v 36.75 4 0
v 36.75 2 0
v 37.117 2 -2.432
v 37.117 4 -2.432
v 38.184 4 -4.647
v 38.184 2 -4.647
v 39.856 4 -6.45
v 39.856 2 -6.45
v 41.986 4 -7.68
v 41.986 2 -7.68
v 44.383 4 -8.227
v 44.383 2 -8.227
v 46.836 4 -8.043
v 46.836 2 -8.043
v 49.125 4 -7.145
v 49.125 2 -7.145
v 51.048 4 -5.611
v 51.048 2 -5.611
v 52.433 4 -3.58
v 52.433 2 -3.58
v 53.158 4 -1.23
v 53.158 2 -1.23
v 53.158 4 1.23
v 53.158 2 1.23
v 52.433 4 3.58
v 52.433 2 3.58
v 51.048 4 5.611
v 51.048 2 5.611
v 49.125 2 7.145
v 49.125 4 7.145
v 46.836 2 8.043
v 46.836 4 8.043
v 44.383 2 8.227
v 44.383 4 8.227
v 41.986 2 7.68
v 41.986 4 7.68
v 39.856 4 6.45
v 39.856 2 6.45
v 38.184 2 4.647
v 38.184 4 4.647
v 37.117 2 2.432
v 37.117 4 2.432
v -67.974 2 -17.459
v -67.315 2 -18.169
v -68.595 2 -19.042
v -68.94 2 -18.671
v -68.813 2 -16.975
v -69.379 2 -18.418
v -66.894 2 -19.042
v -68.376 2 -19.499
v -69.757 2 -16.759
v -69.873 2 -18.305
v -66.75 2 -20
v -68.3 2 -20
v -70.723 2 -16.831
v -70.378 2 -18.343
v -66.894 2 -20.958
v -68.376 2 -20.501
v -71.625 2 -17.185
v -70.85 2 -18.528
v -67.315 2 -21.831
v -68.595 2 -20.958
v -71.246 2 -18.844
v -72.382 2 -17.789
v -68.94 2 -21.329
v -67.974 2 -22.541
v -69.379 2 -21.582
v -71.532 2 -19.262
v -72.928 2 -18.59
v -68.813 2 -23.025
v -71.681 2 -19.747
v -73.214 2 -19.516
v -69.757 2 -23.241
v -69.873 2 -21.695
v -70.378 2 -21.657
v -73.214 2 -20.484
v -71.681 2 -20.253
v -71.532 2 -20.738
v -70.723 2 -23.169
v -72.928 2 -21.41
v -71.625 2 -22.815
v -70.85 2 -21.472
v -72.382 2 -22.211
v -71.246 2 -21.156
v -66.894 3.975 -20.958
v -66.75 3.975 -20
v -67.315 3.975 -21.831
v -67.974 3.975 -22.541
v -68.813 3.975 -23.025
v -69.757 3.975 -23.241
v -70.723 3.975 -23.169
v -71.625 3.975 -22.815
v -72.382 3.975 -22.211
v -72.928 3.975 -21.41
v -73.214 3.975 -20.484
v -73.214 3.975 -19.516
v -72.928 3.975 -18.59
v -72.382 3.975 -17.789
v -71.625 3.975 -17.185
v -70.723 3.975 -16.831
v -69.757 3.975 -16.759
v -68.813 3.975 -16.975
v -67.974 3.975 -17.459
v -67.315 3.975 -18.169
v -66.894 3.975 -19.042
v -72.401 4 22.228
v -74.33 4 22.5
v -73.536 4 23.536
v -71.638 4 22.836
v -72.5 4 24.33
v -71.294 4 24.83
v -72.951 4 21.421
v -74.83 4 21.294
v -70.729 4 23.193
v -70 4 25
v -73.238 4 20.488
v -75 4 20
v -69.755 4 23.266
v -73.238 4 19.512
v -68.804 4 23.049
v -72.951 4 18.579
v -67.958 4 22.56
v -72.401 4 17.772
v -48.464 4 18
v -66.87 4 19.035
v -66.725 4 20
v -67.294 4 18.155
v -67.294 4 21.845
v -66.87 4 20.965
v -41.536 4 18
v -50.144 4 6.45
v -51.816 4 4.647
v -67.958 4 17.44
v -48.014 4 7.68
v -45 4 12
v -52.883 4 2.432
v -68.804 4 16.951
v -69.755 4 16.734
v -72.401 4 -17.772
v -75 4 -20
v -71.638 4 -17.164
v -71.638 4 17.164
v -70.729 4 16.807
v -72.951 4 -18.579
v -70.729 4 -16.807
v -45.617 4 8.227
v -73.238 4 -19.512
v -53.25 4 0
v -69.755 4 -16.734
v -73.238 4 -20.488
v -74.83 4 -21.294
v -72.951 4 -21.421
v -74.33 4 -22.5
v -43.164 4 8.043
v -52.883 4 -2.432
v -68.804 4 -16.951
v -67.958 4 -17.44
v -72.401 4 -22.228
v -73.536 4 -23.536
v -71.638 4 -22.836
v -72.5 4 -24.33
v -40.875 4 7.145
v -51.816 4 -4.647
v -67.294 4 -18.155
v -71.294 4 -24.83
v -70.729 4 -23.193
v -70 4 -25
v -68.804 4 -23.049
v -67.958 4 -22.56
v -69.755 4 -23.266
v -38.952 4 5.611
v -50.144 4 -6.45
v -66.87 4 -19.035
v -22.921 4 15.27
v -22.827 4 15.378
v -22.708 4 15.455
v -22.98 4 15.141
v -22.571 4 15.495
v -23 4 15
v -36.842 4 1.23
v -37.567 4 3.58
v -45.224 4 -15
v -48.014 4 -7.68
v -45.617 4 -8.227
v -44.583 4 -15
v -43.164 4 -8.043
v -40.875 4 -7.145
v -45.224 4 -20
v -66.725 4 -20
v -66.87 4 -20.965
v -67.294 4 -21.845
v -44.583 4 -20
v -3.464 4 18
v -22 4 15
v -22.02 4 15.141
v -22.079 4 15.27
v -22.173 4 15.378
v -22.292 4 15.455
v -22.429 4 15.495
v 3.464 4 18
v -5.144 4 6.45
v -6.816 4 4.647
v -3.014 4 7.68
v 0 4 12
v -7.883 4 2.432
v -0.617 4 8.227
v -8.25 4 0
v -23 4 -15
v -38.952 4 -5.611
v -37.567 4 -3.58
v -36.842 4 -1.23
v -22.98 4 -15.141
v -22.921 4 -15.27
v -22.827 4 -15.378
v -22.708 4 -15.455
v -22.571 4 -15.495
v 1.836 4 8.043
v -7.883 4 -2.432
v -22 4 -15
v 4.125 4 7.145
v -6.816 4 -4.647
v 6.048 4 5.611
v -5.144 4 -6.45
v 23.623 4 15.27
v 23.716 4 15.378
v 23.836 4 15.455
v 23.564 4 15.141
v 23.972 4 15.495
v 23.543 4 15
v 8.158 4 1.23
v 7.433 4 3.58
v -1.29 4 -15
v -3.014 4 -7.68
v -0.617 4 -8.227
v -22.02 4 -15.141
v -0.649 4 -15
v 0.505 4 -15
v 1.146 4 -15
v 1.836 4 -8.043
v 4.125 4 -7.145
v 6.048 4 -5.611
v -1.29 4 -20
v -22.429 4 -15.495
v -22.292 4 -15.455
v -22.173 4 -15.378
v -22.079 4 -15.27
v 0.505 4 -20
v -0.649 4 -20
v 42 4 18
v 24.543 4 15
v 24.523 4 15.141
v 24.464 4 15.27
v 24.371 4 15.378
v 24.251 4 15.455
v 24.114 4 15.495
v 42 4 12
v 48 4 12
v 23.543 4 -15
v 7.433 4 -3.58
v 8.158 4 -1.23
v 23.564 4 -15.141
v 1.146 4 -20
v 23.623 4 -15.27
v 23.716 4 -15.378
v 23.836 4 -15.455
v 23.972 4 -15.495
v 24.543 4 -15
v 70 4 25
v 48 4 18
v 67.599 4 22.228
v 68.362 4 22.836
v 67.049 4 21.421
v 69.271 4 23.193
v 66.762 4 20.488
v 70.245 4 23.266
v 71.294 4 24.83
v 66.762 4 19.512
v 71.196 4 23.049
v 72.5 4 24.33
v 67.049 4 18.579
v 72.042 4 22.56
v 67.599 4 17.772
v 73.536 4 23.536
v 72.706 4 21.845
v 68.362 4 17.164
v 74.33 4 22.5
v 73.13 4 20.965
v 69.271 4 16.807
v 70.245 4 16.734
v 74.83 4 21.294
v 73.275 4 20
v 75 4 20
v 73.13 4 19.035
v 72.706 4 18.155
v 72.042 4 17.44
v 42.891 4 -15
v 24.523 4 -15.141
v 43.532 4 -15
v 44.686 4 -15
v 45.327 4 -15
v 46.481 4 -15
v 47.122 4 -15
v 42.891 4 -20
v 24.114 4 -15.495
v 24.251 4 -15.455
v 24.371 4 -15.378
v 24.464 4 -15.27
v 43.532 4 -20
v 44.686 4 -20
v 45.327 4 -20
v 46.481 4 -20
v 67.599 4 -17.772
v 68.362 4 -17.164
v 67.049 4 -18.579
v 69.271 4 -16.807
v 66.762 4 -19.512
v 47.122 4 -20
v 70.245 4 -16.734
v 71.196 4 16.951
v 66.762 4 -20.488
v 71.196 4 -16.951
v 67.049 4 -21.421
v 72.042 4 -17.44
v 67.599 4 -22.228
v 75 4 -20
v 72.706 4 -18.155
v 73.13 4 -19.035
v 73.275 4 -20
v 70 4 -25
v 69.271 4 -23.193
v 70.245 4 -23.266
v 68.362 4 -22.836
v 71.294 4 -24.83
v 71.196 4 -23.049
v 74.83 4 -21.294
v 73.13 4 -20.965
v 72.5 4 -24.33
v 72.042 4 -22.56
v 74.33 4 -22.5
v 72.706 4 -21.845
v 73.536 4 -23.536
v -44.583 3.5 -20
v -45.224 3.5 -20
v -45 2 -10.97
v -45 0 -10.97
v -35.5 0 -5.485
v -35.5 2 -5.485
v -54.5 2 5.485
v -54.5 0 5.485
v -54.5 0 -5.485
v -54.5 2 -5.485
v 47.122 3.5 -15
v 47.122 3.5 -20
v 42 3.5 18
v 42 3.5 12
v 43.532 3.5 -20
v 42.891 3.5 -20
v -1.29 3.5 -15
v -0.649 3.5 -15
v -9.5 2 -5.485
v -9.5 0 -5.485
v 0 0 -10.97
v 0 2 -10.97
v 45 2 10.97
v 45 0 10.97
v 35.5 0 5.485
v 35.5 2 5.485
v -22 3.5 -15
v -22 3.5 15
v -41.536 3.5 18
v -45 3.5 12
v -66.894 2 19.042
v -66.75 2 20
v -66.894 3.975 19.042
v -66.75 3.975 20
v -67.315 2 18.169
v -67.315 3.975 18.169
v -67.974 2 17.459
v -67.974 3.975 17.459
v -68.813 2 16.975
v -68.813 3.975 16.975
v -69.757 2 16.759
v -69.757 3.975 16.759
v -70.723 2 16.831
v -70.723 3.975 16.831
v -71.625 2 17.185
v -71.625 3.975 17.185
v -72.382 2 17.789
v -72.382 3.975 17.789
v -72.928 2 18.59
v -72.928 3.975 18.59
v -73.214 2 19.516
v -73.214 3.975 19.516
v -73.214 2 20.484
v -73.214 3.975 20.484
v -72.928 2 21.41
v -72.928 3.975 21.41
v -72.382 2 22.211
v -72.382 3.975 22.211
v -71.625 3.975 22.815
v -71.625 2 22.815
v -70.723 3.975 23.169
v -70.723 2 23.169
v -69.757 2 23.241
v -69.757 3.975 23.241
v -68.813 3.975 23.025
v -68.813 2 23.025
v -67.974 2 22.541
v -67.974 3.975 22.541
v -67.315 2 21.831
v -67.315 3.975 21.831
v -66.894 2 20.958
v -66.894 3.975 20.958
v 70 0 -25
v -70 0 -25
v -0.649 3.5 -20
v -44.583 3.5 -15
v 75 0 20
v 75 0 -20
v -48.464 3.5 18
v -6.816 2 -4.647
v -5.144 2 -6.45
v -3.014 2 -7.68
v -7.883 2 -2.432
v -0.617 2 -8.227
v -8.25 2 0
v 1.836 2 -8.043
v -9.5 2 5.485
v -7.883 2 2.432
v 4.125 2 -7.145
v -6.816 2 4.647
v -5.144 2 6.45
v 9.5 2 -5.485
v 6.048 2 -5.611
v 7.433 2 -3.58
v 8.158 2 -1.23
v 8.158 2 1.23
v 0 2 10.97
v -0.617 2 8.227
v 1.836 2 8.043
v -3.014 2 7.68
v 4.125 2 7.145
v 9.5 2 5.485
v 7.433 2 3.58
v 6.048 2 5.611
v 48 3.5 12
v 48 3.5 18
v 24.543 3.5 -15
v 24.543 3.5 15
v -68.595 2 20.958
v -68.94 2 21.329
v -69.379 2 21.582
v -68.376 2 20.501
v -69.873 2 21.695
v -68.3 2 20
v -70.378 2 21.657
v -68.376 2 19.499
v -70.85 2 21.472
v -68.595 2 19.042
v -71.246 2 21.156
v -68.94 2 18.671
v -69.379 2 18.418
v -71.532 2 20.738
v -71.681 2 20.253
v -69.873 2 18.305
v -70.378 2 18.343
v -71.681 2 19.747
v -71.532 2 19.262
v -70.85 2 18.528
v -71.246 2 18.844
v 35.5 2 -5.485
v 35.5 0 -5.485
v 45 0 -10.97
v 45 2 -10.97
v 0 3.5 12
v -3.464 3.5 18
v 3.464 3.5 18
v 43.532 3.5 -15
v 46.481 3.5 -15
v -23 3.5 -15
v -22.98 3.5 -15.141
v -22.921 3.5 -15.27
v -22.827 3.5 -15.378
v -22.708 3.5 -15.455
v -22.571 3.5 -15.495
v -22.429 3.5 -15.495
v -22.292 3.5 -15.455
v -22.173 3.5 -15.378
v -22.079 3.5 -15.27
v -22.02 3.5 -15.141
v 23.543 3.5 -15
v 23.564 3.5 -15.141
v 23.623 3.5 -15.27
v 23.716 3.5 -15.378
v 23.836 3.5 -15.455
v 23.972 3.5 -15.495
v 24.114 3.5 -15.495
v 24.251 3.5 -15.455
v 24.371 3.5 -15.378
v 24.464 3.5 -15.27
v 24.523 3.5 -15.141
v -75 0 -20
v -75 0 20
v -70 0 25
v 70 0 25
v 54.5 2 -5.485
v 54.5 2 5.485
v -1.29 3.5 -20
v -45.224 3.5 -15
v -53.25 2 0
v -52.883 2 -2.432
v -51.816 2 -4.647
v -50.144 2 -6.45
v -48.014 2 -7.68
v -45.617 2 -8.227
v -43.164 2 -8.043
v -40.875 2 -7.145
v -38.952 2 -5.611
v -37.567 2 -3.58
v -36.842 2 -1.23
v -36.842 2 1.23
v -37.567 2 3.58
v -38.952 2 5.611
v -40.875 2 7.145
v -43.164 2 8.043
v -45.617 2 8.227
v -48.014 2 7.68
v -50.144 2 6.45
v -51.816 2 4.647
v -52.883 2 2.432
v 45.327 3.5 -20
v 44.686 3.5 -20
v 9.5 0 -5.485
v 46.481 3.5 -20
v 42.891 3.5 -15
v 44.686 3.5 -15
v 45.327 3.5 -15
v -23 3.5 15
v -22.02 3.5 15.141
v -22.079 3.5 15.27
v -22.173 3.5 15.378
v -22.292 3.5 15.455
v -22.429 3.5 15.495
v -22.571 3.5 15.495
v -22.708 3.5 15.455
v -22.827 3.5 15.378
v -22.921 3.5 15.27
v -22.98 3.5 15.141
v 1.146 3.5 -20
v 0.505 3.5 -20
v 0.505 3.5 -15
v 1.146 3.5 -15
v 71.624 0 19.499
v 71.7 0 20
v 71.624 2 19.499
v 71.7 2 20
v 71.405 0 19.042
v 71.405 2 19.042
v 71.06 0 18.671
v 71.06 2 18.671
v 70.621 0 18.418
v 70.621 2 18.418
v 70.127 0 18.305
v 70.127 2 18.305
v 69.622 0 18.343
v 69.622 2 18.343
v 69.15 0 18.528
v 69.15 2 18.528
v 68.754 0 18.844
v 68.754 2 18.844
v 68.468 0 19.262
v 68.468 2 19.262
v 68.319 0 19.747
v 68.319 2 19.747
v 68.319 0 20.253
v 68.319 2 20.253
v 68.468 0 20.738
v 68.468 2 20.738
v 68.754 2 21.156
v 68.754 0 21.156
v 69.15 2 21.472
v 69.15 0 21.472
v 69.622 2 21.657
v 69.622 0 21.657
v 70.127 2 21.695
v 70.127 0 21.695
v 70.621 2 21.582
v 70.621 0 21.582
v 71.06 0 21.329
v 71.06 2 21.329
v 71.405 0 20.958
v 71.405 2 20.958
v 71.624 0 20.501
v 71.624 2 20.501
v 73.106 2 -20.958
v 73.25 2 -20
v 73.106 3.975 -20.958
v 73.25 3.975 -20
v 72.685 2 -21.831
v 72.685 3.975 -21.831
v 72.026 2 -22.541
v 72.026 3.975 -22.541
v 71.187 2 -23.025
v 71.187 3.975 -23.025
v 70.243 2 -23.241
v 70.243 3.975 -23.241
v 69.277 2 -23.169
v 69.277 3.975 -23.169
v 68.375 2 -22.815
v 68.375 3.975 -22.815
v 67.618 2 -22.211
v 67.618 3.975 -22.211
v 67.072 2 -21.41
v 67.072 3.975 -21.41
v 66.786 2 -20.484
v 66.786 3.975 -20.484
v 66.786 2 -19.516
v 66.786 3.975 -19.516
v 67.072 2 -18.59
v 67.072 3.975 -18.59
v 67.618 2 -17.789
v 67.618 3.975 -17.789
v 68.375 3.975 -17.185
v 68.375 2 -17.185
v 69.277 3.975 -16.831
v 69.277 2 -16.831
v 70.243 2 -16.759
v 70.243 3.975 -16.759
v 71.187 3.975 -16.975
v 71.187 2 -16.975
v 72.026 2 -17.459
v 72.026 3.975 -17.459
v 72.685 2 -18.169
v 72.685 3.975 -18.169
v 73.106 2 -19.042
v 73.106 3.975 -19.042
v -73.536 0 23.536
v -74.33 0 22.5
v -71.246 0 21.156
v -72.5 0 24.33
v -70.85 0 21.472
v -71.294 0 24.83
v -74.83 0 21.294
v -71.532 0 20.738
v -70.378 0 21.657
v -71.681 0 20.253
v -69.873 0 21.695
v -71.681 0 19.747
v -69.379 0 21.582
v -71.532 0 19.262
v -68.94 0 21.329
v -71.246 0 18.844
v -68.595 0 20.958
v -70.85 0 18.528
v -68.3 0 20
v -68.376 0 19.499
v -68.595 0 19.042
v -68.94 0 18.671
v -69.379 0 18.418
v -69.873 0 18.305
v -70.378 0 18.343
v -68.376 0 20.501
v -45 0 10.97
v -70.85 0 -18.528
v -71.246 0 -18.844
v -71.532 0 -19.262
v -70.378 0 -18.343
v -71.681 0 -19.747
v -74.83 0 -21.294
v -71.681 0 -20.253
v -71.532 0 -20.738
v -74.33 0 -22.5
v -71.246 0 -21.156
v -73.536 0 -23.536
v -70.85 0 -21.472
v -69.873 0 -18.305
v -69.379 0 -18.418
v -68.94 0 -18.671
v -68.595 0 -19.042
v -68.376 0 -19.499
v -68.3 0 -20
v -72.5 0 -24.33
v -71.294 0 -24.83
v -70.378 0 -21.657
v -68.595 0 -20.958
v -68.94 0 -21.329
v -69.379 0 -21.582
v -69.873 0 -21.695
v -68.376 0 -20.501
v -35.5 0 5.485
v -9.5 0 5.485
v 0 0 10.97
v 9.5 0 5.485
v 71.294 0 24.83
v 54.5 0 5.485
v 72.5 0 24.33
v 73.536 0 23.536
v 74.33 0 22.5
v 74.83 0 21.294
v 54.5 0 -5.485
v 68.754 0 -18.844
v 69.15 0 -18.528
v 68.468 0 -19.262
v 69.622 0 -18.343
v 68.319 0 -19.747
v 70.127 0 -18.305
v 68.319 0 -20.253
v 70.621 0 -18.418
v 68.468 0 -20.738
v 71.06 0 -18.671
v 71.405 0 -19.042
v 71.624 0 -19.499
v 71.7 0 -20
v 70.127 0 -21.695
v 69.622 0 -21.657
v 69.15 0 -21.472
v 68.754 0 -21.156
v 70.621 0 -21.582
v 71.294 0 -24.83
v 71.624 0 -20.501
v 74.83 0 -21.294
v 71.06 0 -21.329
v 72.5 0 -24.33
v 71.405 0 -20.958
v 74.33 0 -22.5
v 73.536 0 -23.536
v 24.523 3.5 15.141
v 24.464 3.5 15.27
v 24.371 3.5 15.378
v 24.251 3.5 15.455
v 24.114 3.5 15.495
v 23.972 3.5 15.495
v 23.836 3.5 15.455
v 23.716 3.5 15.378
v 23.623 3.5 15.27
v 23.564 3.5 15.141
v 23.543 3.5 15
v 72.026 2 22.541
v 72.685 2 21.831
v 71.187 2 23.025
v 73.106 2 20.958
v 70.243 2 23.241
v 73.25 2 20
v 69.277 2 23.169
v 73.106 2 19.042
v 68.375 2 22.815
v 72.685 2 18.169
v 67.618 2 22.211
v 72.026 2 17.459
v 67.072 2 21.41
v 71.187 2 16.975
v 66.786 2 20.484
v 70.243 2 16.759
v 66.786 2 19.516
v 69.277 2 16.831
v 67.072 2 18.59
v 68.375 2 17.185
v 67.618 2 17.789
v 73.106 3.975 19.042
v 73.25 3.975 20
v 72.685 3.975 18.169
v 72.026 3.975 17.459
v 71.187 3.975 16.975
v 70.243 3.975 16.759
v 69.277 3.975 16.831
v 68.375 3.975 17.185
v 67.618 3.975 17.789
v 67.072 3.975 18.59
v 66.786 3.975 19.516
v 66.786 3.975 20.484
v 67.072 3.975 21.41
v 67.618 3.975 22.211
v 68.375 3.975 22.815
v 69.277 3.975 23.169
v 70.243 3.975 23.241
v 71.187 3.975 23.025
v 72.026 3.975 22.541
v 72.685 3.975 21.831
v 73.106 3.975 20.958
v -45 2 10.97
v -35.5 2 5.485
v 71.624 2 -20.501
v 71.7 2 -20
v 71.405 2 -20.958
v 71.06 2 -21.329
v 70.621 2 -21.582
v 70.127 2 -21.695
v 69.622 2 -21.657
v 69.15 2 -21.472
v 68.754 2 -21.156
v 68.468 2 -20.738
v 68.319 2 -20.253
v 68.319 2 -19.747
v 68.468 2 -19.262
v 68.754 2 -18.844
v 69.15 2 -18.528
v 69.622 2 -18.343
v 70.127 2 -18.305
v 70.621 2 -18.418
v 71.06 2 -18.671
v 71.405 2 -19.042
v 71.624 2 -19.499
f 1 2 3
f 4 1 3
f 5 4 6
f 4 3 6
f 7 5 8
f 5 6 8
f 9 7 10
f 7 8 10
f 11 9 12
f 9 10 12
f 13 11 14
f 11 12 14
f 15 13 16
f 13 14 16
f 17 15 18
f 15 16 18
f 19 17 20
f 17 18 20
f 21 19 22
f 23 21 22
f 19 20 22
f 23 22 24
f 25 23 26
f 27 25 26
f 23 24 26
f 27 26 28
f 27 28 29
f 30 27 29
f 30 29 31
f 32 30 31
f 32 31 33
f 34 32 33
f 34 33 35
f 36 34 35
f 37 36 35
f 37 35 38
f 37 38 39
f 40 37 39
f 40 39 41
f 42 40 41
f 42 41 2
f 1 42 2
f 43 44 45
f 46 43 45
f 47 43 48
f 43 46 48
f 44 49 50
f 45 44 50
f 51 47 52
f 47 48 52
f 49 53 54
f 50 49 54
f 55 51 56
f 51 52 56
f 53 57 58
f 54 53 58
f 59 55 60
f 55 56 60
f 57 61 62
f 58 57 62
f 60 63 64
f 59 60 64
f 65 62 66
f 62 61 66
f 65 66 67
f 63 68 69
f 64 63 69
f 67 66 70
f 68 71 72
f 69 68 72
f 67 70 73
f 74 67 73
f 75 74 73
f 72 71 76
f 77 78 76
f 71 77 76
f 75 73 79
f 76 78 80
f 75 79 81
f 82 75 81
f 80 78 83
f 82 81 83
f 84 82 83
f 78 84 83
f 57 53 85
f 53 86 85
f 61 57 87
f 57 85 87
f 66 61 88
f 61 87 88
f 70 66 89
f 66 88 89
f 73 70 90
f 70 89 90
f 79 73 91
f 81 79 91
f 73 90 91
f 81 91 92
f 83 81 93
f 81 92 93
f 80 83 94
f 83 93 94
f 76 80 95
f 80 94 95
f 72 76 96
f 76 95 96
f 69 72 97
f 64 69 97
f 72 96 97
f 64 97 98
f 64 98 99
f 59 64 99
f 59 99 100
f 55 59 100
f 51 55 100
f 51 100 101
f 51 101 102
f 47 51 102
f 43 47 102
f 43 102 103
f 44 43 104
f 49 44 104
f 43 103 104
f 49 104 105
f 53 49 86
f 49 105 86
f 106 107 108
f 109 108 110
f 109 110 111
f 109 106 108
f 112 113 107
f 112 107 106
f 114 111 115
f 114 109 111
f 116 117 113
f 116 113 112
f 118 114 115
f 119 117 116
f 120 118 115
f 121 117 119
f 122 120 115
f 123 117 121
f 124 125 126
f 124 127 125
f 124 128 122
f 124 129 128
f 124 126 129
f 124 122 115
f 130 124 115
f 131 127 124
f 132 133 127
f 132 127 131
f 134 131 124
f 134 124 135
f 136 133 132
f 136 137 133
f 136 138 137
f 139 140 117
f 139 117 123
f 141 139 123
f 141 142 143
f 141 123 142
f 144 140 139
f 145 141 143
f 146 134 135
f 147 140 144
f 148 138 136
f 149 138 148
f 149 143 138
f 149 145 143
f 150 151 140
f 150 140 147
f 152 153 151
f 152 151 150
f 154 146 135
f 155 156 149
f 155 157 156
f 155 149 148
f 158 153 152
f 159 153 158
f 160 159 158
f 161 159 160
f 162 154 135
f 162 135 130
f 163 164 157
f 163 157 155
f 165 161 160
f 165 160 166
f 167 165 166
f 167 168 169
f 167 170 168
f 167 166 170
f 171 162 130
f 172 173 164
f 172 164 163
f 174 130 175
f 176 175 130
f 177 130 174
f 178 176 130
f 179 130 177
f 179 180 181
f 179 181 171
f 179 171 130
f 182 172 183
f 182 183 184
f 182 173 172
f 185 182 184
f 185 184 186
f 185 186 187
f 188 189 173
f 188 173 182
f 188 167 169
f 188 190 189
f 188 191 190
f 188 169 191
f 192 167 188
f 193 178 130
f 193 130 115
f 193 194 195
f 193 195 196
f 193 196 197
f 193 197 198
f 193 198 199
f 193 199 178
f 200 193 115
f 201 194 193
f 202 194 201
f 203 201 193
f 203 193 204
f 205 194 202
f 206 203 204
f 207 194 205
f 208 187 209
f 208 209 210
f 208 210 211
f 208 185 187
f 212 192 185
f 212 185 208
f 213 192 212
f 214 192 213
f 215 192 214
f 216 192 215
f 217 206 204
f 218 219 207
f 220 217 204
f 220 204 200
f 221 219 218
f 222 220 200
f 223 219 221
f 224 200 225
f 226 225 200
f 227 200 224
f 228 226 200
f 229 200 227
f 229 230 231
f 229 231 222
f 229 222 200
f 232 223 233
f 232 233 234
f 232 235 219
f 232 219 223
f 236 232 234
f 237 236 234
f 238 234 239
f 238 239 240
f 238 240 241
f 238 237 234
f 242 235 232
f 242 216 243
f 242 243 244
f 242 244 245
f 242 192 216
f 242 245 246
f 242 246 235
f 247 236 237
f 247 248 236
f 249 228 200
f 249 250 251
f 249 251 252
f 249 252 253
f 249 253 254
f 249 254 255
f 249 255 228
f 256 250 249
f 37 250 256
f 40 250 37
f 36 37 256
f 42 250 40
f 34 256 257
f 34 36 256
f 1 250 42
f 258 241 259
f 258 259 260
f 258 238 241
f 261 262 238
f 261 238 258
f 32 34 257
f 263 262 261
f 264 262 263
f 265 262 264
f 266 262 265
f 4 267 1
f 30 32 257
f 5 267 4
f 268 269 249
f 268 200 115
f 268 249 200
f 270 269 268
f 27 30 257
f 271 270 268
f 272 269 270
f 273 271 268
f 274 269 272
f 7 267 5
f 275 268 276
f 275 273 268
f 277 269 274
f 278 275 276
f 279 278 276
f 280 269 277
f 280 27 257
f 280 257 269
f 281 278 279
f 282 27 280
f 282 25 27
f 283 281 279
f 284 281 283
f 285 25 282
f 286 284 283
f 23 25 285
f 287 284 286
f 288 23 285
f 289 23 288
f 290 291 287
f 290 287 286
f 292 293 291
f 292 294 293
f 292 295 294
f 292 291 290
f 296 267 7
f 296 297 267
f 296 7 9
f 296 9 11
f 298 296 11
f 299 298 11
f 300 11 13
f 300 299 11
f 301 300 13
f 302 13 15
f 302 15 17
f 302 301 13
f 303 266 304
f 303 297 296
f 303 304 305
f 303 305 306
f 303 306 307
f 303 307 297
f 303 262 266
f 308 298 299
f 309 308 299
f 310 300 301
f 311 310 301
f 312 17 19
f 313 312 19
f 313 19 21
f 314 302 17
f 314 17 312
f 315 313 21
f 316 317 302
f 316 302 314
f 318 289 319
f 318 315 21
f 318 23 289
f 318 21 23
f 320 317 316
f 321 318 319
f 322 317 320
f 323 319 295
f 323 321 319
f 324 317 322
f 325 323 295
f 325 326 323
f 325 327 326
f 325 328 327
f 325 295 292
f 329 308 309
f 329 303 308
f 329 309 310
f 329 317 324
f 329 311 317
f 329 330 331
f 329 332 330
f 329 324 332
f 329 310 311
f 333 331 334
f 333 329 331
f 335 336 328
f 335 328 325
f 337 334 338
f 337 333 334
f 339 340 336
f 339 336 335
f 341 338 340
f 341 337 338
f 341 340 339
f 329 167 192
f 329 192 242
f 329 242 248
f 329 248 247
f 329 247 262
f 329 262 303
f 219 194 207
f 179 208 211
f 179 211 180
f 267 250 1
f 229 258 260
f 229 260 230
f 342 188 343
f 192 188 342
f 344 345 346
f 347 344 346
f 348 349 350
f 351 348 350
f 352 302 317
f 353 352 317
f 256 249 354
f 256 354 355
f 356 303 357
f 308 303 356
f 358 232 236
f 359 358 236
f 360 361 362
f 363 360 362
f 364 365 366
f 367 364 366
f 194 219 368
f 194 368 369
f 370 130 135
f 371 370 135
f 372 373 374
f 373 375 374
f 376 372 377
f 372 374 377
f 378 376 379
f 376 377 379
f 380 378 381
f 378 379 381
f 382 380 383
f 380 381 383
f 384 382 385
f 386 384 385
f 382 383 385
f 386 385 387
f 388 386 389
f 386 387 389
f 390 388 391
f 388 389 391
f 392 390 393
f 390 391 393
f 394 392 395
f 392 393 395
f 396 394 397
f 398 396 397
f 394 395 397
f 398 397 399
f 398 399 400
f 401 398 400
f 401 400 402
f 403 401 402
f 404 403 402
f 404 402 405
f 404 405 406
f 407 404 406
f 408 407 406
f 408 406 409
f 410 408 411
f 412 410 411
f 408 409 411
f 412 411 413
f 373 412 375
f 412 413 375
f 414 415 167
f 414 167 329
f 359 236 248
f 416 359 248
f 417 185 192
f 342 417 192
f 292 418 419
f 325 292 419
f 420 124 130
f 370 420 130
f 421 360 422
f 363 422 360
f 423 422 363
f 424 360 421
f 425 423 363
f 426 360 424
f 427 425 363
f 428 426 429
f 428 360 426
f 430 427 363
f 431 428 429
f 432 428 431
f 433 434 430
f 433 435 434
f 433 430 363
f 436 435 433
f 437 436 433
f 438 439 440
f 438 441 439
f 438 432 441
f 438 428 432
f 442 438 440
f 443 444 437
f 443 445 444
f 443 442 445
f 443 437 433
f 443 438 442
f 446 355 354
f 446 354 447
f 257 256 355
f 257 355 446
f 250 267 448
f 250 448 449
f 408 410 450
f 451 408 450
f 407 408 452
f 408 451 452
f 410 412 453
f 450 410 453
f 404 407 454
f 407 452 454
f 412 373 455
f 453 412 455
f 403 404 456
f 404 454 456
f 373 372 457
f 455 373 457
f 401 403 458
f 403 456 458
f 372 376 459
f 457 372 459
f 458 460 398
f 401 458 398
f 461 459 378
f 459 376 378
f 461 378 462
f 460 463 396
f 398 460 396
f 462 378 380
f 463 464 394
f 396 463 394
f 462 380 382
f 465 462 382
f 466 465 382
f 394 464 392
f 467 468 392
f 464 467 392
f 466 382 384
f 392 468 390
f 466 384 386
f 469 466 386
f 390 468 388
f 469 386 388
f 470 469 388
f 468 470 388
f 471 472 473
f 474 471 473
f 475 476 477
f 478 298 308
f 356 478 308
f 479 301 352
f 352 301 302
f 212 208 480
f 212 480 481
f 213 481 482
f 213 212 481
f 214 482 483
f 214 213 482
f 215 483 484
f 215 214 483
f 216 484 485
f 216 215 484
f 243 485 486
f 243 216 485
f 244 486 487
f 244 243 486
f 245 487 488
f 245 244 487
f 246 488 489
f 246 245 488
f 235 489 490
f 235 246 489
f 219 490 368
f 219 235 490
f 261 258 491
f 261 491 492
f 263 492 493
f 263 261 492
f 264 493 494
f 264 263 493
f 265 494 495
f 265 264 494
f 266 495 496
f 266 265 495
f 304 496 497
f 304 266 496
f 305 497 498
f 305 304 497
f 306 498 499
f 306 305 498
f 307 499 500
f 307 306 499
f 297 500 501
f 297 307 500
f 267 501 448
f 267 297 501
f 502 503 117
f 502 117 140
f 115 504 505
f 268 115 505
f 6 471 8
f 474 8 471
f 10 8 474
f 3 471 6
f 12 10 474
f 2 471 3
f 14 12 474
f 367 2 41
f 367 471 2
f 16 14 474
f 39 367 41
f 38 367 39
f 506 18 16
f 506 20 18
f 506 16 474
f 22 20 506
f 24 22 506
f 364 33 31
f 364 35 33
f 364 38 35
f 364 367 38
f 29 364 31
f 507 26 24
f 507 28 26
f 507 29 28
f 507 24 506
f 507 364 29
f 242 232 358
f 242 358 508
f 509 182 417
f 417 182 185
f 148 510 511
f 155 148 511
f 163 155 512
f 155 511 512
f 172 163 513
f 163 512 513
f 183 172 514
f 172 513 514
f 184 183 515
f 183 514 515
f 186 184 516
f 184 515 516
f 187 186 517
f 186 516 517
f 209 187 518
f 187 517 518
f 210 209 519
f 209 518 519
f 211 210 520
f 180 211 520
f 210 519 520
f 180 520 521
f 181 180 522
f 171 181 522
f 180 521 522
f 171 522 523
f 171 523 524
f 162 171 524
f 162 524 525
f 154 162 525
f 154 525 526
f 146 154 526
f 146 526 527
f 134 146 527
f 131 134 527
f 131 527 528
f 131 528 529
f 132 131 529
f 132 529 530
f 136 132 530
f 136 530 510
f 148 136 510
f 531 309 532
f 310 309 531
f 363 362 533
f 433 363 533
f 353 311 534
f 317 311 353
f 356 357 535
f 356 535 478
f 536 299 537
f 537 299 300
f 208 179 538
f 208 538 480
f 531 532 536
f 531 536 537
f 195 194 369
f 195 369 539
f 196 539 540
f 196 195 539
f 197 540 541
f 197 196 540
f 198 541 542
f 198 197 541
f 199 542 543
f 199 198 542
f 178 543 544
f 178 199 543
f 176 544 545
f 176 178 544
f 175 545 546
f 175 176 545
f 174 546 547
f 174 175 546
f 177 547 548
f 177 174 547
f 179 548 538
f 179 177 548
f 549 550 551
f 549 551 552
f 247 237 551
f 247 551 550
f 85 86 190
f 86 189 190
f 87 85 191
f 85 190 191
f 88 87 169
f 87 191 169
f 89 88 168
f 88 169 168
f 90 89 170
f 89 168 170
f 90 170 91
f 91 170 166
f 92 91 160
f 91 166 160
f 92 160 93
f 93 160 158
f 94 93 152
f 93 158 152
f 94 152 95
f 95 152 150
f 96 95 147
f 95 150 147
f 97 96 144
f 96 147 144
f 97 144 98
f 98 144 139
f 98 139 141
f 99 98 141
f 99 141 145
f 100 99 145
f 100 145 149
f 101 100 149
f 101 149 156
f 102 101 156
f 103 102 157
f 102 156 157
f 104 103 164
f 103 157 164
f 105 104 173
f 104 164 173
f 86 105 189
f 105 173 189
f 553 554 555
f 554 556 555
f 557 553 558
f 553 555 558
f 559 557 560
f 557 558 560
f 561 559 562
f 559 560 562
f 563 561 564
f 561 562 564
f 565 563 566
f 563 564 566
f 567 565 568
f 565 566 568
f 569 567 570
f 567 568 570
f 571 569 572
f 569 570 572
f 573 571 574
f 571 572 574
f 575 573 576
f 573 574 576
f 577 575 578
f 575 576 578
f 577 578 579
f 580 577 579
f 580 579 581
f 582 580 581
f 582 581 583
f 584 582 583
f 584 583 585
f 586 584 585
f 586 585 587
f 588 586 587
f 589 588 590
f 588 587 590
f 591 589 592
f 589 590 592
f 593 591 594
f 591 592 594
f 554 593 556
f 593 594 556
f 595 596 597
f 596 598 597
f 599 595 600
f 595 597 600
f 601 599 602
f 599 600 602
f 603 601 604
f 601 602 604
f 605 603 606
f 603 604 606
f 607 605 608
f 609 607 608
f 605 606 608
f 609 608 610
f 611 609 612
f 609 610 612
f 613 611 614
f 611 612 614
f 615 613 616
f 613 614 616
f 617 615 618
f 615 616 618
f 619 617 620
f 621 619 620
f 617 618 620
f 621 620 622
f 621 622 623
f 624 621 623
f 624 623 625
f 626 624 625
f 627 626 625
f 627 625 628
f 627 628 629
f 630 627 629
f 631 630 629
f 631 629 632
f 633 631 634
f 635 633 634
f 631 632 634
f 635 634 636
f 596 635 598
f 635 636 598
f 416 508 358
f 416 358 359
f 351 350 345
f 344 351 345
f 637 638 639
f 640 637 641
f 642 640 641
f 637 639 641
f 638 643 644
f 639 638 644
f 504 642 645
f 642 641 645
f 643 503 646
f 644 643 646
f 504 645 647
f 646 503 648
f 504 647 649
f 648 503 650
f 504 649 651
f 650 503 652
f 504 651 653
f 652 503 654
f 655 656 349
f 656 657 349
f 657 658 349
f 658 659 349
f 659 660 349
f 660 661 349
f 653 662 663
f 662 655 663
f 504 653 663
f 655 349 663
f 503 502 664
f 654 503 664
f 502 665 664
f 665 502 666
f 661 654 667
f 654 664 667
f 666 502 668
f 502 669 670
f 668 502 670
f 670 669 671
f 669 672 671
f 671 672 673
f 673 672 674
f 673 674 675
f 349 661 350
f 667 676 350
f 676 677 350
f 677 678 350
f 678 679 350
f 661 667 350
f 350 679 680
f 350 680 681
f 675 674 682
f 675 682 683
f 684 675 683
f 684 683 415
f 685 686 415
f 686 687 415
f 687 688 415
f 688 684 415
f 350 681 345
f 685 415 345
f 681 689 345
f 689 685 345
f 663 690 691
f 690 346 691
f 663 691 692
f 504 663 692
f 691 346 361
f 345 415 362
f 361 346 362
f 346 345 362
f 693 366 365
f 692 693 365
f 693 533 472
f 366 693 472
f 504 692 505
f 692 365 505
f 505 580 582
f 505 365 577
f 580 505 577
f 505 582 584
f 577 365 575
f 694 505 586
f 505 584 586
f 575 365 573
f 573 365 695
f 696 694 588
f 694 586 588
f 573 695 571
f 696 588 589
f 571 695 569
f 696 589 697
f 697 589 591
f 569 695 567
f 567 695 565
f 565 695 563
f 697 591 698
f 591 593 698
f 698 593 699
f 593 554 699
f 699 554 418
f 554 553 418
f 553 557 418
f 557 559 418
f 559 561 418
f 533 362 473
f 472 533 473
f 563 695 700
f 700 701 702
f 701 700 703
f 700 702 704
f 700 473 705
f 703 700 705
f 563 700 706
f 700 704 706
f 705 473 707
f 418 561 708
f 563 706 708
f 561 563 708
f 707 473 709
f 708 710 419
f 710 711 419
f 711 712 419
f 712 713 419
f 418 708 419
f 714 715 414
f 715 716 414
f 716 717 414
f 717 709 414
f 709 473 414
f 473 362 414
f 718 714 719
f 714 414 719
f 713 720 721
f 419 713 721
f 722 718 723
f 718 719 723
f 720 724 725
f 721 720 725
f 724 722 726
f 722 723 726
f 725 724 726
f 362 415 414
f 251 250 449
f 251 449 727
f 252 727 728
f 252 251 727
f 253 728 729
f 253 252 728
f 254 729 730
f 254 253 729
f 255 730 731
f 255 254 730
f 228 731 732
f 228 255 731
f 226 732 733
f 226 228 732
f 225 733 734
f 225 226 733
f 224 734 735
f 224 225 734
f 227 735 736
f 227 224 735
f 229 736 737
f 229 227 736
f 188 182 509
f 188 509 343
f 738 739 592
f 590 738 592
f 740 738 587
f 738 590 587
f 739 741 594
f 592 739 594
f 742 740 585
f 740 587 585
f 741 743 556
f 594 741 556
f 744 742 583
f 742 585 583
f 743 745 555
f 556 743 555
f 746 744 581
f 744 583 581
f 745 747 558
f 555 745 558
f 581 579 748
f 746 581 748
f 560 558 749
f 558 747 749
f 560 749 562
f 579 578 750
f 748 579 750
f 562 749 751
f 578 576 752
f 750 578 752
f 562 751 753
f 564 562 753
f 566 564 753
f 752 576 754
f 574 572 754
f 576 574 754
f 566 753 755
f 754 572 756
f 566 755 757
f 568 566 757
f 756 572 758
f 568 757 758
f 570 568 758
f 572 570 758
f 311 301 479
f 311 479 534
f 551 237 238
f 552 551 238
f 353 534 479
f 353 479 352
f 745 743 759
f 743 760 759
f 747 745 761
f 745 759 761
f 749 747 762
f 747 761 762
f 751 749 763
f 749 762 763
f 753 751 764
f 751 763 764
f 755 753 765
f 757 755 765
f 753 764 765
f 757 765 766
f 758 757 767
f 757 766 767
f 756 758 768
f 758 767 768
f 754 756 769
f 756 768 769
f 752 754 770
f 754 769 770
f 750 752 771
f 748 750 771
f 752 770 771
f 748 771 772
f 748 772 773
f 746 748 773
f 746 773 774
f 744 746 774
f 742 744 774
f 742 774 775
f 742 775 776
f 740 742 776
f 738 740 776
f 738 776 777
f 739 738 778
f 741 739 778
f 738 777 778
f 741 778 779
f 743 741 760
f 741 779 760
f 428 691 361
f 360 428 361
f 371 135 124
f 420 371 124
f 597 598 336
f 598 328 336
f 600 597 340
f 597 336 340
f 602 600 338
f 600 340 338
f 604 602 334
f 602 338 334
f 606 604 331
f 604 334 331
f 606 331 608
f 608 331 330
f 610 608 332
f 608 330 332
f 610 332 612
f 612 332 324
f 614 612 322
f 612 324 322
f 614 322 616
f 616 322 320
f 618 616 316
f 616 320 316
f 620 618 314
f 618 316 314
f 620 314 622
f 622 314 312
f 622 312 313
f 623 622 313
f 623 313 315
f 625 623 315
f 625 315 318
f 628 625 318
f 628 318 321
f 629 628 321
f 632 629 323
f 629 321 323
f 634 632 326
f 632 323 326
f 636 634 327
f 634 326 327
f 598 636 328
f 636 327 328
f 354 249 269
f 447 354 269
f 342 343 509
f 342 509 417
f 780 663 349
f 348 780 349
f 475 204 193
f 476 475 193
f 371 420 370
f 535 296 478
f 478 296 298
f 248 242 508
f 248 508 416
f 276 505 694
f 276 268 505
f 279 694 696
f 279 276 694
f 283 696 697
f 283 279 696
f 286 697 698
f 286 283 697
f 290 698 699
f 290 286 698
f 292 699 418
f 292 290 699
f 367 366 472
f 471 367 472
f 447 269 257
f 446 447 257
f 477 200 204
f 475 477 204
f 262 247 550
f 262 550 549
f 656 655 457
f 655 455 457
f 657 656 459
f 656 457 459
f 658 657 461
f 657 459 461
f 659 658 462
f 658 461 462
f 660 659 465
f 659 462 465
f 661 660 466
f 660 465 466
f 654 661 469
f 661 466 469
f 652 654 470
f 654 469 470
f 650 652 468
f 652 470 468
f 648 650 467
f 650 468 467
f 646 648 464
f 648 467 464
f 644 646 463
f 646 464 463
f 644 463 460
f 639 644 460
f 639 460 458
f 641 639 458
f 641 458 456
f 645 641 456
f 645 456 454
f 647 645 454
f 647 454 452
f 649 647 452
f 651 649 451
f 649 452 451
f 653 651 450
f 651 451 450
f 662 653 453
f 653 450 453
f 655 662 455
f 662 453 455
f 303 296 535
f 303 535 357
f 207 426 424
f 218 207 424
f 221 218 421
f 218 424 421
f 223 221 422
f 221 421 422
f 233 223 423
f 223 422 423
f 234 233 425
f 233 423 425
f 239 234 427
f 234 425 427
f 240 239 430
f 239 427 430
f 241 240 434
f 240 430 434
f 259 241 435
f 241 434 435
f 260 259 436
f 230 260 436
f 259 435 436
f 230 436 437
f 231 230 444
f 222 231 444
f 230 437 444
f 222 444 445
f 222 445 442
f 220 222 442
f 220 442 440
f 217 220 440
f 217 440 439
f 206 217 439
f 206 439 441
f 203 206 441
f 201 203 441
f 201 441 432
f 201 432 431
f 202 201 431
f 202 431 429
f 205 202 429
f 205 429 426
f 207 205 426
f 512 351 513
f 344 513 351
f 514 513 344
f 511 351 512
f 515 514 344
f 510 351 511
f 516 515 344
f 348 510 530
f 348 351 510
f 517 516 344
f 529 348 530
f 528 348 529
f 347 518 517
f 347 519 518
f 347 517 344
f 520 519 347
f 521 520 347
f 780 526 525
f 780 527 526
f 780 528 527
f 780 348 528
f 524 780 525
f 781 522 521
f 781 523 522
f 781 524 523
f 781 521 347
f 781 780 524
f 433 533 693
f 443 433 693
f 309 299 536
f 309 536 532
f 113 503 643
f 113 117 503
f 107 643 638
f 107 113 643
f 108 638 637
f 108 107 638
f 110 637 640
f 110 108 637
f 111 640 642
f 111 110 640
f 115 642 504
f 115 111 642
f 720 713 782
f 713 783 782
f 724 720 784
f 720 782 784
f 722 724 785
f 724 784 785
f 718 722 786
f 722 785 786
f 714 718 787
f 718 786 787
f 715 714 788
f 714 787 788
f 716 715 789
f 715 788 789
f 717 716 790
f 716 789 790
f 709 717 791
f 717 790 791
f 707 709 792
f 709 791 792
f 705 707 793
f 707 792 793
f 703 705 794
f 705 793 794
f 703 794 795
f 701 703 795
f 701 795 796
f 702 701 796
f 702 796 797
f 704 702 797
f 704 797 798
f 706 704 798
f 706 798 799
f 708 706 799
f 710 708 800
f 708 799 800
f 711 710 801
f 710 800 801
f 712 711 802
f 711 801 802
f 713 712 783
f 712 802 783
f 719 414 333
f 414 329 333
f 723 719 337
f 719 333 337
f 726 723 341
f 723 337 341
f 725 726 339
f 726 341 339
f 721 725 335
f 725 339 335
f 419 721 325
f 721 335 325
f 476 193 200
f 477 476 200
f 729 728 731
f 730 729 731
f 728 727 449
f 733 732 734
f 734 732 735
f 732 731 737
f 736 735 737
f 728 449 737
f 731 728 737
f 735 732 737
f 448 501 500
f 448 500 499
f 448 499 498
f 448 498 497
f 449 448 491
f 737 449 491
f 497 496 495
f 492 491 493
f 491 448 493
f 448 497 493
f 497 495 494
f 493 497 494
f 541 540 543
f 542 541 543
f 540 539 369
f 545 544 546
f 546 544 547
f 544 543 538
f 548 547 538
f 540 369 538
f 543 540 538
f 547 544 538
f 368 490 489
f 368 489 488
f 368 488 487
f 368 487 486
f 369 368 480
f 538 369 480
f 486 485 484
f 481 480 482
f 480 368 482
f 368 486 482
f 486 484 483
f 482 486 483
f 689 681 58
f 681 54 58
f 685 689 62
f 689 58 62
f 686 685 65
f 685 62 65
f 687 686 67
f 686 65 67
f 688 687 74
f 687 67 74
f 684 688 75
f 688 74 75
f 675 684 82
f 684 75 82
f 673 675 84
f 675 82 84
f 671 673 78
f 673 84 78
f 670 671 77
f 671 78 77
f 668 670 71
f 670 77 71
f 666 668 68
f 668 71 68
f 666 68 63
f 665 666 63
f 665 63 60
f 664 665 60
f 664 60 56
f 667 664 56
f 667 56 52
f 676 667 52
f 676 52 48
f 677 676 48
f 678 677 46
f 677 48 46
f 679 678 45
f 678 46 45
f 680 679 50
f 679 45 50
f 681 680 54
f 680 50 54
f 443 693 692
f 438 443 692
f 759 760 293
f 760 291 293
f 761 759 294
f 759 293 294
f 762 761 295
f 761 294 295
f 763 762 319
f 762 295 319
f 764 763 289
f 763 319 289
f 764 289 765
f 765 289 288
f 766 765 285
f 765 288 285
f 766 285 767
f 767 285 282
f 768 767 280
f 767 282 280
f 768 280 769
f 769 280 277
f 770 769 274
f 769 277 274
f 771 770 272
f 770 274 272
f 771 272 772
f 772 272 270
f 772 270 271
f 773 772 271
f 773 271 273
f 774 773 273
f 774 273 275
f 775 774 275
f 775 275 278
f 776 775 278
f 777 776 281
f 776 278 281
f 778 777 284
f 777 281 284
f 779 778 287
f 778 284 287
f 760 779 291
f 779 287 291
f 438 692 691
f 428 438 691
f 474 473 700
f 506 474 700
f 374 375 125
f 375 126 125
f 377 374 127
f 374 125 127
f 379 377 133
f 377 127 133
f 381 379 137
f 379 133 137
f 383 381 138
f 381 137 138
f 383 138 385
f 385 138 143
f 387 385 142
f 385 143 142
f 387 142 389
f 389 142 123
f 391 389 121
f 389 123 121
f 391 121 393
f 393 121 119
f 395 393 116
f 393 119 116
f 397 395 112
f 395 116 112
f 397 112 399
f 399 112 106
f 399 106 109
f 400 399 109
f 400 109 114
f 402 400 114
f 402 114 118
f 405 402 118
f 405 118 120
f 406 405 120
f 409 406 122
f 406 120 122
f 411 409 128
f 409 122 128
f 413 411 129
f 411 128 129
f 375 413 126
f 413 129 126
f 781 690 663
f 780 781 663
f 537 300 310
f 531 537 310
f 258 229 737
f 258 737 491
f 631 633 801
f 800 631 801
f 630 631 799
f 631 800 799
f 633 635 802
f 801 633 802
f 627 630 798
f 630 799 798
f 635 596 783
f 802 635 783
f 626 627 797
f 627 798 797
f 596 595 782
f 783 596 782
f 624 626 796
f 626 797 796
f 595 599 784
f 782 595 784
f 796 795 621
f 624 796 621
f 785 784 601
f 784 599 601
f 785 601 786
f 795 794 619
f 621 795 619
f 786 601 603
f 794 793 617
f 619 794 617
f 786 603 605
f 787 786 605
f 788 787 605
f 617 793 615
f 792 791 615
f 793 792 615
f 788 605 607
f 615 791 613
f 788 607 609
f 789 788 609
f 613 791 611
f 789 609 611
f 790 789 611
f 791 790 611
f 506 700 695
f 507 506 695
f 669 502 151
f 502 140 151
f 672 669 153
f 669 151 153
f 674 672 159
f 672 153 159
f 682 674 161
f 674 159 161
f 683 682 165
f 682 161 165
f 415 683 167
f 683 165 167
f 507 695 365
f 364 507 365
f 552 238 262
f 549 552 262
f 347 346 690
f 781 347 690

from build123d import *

# Parameters (mm, degrees)
SKETCH1_W                = 150
SKETCH1_H                = 50
BODY_DEPTH               = 4
EDGE_FILLETS_R           = 5
GX16_HOLE_D              = 16.5
GX16_NUT_CUTOUT_DEPTH    = 2
GX16_PATTERN_COUNT       = 3
GX16_PATTERN_PITCH       = 45
DESIGN_CUTOUT_SKETCH_W   = 6
DESIGN_CUTOUT_SKETCH_H   = 6
DESIGN_CUTOUT_SKETCH_W_2 = 0.641025641
DESIGN_CUTOUT_SKETCH_H_2 = 5
DESIGN_CUTOUT_DEPTH      = 0.5


# Read off the part's stored shape, not the designer's step: mounting_holes
with BuildPart() as part:
    # Sketch1 → body (new body)
    with BuildSketch(Plane(origin=(0, 0, 0), x_dir=(1, 0, 0), z_dir=(0, 1, 0))):
        Rectangle(SKETCH1_W, SKETCH1_H)
    extrude(amount=BODY_DEPTH)

    # mounting_holes outline → mounting_holes (revolve, cut)
    with BuildSketch(Plane(origin=(70, 0, 20), x_dir=(1, 0, 0), z_dir=(0, 0, 1))):
        Polygon((0, 0), (1.7, 0), (1.7, 2), (3.25, 2), (3.25, 3.975), (3.275, 4), (0, 4), align=None)
    revolve(axis=Axis((70, 0, 20), (0, 1, 0)), mode=Mode.SUBTRACT)

    # mounting_holes 2 outline → mounting_holes 2 (revolve, cut)
    with BuildSketch(Plane(origin=(-70, 0, -20), x_dir=(1, 0, 0), z_dir=(0, 0, 1))):
        Polygon((0, 4), (0, 0), (1.7, 0), (1.7, 2), (3.25, 2), (3.25, 3.975), (3.275, 4), align=None)
    revolve(axis=Axis((-70, 0, -20), (0, 1, 0)), mode=Mode.SUBTRACT)

    # mounting_holes 3 outline → mounting_holes 3 (revolve, cut)
    with BuildSketch(Plane(origin=(70, 0, -20), x_dir=(1, 0, 0), z_dir=(0, 0, 1))):
        Polygon((0, 4), (0, 0), (1.7, 0), (1.7, 2), (3.25, 2), (3.25, 3.975), (3.275, 4), align=None)
    revolve(axis=Axis((70, 0, -20), (0, 1, 0)), mode=Mode.SUBTRACT)

    # mounting_holes 4 outline → mounting_holes 4 (revolve, cut)
    with BuildSketch(Plane(origin=(-70, 0, 20), x_dir=(1, 0, 0), z_dir=(0, 0, 1))):
        Polygon((0, 4), (0, 0), (1.7, 0), (1.7, 2), (3.25, 2), (3.25, 3.975), (3.275, 4), align=None)
    revolve(axis=Axis((-70, 0, 20), (0, 1, 0)), mode=Mode.SUBTRACT)

    # edge_fillets
    edge_fillets_edges = [part.edges().sort_by_distance(p)[0] for p in [
        (75, 2, 25),
        (-75, 2, 25),
        (-75, 2, -25),
        (75, 2, -25),
    ]]
    fillet(edge_fillets_edges, radius=EDGE_FILLETS_R)

    # gx16_hole (through all)
    with Locations(Plane(origin=(0, 4, 0), x_dir=(1, 0, 0), z_dir=(0, 1, 0))):
        with Locations((-45, 0)):
            gx16_hole = Hole(GX16_HOLE_D / 2)

    # Sketch6 → gx16_nut-cutout (cut)
    with BuildSketch(Plane.XZ):
        Polygon((-45, 10.969655115), (-54.5, 5.484827557), (-54.5, -5.484827557), (-45, -10.969655115), (-35.5, -5.484827557), (-35.5, 5.484827557), align=None)
    gx16_nut_cutout = extrude(amount=-GX16_NUT_CUTOUT_DEPTH, mode=Mode.SUBTRACT)

    # gx16_pattern: gx16_hole, gx16_nut-cutout ×3
    with Locations(*[(i * GX16_PATTERN_PITCH, 0, 0) for i in range(1, GX16_PATTERN_COUNT)]):
        add(gx16_hole, mode=Mode.SUBTRACT)
        add(gx16_nut_cutout, mode=Mode.SUBTRACT)

    # design_cutout_sketch → design_cutout (cut)
    with BuildSketch(Plane(origin=(0, 4, 0), x_dir=(1, 0, 0), z_dir=(0, 1, 0))):
        with BuildLine():
            Line((-22, 15), (-22, -15))
            ThreePointArc((-22, -15), (-22.5, -15.5), (-23, -15))
            Line((-23, -15), (-23, 15))
            ThreePointArc((-23, 15), (-22.5, 15.5), (-22, 15))
        make_face()
        with BuildLine():
            Line((24.543317326, 15), (24.543317326, -15))
            ThreePointArc((24.543317326, -15), (24.043317326, -15.5), (23.543317326, -15))
            Line((23.543317326, -15), (23.543317326, 15))
            ThreePointArc((23.543317326, 15), (24.043317326, 15.5), (24.543317326, 15))
        make_face()
        with Locations((45, -15)):
            Rectangle(DESIGN_CUTOUT_SKETCH_W, DESIGN_CUTOUT_SKETCH_H)
        Polygon((0, -12), (-3.464101615, -18), (3.464101615, -18), align=None)
        Polygon((-45, -12), (-48.464101615, -18), (-41.535898385, -18), align=None)
        with Locations((-44.903846154, 17.5)):
            Rectangle(DESIGN_CUTOUT_SKETCH_W_2, DESIGN_CUTOUT_SKETCH_H_2)
        with Locations((-0.969230769, 17.5)):
            Rectangle(DESIGN_CUTOUT_SKETCH_W_2, DESIGN_CUTOUT_SKETCH_H_2)
        with Locations((0.825641025, 17.5)):
            Rectangle(DESIGN_CUTOUT_SKETCH_W_2, DESIGN_CUTOUT_SKETCH_H_2)
        with Locations((43.211538462, 17.5)):
            Rectangle(DESIGN_CUTOUT_SKETCH_W_2, DESIGN_CUTOUT_SKETCH_H_2)
        with Locations((45.006410257, 17.5)):
            Rectangle(DESIGN_CUTOUT_SKETCH_W_2, DESIGN_CUTOUT_SKETCH_H_2)
        with Locations((46.801282052, 17.5)):
            Rectangle(DESIGN_CUTOUT_SKETCH_W_2, DESIGN_CUTOUT_SKETCH_H_2)
    extrude(amount=-DESIGN_CUTOUT_DEPTH, mode=Mode.SUBTRACT)


solid = part.part
